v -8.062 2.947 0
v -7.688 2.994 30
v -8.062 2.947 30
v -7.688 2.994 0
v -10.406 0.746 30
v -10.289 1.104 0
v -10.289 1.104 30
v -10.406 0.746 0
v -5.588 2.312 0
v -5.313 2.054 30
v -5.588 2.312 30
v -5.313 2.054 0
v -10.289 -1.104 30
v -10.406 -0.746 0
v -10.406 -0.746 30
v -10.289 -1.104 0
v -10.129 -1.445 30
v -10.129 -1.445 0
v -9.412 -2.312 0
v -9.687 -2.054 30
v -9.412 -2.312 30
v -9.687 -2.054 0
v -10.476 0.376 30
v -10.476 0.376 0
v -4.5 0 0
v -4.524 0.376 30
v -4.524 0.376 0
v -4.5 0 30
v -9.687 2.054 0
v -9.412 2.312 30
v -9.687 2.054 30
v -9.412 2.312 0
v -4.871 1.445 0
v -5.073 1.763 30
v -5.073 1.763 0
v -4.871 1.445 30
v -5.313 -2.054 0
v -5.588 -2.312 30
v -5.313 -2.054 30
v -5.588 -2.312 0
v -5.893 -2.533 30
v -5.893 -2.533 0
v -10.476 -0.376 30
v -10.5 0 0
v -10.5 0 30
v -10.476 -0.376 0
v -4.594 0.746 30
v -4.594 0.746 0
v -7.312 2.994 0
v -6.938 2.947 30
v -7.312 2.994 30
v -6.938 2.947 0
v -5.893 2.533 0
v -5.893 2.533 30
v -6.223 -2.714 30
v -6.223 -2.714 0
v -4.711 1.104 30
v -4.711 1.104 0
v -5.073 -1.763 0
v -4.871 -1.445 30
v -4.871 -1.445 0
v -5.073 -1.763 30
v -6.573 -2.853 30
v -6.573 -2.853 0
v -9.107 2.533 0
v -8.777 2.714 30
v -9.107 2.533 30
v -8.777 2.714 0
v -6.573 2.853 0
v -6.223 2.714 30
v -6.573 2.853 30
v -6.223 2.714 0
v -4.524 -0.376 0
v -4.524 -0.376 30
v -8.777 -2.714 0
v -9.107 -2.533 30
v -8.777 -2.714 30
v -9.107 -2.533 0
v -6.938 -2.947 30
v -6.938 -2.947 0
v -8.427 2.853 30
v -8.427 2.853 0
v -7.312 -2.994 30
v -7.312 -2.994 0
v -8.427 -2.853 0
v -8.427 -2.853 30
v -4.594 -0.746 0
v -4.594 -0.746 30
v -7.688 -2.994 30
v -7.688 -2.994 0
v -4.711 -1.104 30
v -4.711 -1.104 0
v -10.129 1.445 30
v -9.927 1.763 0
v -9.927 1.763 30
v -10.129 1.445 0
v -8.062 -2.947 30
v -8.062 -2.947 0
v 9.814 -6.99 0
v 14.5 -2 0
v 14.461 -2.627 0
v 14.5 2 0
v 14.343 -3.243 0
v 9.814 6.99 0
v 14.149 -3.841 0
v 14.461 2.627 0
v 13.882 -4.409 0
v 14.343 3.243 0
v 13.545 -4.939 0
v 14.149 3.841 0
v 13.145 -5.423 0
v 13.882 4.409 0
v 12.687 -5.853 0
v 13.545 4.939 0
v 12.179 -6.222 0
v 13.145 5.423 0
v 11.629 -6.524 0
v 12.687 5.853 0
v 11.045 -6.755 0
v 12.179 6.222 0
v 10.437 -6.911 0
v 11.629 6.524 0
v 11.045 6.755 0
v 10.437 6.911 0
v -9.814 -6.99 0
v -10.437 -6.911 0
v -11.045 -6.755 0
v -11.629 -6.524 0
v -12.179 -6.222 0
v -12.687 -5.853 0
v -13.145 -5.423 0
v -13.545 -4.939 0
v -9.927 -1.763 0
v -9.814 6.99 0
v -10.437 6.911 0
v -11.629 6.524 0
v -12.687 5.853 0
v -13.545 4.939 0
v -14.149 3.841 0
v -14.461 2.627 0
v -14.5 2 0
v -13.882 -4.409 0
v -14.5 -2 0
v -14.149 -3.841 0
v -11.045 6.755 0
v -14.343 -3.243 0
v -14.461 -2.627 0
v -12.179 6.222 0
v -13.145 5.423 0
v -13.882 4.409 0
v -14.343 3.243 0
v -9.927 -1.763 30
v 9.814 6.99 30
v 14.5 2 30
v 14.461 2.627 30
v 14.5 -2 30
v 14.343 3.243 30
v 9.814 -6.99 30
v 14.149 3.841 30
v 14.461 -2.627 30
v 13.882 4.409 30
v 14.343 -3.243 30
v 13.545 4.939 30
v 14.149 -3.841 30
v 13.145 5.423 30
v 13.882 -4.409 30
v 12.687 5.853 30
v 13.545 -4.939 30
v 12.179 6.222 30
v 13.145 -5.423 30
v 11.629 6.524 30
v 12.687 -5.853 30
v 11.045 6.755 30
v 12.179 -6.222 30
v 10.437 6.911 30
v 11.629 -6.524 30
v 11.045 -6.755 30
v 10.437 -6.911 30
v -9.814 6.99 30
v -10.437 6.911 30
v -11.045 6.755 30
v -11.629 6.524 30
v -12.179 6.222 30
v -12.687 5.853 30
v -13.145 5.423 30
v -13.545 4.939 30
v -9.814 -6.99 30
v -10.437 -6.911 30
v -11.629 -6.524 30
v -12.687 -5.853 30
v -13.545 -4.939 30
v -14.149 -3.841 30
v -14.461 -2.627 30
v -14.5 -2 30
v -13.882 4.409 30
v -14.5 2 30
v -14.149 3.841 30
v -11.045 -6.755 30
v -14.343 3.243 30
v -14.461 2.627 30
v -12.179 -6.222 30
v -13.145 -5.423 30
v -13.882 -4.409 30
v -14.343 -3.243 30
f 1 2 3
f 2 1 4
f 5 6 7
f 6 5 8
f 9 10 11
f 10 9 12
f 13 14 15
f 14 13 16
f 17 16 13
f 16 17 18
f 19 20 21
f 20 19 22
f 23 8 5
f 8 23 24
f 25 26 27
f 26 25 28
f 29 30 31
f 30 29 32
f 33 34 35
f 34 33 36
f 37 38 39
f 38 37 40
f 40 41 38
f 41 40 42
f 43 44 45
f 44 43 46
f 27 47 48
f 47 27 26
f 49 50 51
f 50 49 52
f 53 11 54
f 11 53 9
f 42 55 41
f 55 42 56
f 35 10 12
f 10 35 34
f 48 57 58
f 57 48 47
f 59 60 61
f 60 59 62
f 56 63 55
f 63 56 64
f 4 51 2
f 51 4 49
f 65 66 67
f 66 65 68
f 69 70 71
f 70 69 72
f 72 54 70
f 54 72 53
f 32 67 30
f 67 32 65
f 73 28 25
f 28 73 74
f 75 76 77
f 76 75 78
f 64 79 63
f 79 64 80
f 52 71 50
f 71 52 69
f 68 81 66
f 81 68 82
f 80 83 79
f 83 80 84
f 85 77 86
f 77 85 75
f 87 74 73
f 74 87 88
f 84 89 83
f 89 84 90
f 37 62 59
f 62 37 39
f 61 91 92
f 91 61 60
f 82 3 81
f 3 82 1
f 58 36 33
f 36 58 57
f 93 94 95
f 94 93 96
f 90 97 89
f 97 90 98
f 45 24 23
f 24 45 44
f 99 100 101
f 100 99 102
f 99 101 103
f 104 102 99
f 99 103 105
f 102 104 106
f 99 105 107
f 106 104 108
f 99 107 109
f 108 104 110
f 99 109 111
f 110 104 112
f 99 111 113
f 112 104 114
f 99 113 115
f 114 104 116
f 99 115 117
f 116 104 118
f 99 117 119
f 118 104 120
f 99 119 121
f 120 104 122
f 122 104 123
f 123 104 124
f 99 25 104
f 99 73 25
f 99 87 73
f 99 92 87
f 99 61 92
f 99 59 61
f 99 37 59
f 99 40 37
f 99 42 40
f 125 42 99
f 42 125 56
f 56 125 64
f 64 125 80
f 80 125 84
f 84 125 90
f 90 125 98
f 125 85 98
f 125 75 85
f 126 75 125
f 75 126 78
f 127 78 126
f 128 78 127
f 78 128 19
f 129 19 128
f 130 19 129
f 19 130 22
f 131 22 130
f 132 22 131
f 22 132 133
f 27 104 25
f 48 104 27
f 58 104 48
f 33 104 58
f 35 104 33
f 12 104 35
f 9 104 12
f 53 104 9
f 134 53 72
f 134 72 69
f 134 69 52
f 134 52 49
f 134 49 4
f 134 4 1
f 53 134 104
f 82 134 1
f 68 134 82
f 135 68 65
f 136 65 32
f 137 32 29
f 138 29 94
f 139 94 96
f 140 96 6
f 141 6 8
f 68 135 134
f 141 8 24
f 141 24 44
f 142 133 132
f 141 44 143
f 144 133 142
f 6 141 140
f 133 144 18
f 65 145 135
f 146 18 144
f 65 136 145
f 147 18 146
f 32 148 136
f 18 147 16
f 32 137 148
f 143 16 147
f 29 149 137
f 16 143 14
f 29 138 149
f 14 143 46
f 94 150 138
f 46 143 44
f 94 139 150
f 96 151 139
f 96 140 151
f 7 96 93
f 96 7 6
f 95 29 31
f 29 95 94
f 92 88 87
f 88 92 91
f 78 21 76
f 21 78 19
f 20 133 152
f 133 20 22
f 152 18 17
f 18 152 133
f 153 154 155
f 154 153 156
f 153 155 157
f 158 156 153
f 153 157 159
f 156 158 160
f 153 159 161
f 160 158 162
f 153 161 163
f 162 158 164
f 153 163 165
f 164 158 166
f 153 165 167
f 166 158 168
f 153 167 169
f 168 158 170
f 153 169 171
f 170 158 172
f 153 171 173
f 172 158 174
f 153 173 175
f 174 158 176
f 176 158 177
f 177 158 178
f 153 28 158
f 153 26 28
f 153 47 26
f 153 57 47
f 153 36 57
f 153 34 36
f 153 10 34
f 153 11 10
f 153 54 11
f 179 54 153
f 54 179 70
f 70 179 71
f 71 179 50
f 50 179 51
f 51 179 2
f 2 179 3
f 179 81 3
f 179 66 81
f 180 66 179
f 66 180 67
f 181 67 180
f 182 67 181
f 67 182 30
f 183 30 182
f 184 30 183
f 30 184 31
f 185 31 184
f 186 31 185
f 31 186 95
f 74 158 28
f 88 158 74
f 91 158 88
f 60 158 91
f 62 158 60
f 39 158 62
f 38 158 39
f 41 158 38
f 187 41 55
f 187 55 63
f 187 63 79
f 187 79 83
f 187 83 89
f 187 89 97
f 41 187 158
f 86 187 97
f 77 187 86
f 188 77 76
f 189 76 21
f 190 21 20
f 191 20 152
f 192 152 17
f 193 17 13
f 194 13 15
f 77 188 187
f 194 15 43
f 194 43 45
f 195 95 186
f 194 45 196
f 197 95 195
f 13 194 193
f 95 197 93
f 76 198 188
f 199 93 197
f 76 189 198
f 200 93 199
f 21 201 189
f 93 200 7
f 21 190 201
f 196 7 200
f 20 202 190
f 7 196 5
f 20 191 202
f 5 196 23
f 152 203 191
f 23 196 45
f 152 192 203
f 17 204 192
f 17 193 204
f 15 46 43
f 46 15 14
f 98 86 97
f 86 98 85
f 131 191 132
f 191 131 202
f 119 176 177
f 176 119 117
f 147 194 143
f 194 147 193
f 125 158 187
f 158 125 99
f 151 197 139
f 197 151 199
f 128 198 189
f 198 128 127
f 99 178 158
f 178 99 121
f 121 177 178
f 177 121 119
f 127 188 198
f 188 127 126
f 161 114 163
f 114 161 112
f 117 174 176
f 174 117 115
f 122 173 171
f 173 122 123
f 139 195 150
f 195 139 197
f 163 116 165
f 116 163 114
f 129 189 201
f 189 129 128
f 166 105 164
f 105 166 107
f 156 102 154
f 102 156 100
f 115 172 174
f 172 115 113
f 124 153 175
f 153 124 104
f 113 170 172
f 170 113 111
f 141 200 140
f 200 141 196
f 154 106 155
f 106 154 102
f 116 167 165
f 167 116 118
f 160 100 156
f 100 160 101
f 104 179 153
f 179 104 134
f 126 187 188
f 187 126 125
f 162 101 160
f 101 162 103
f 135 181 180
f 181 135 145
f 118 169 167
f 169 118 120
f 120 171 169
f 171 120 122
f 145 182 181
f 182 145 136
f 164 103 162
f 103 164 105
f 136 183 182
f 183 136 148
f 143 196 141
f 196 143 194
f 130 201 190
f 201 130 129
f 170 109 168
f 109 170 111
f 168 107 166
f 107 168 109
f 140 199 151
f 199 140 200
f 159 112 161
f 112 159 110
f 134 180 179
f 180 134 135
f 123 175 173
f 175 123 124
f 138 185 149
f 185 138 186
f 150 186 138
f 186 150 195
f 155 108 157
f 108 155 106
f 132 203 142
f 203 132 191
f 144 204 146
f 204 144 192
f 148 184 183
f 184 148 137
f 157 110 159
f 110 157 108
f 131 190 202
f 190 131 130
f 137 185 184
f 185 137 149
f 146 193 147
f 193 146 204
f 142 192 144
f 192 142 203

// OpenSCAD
$fn = 50;


difference() {
	union() {
		hull() {
			translate(v = [-9.5000000000, 2.0000000000, 0]) {
				cylinder(h = 30, r = 5);
			}
			translate(v = [9.5000000000, 2.0000000000, 0]) {
				cylinder(h = 30, r = 5);
			}
			translate(v = [-9.5000000000, -2.0000000000, 0]) {
				cylinder(h = 30, r = 5);
			}
			translate(v = [9.5000000000, -2.0000000000, 0]) {
				cylinder(h = 30, r = 5);
			}
		}
	}
	union() {
		translate(v = [-7.5000000000, 0.0000000000, 0]) {
			cylinder(h = 30, r = 3.0000000000);
		}
		translate(v = [-7.5000000000, 0.0000000000, 0]) {
			cylinder(h = 30, r = 1.5000000000);
		}
		translate(v = [-7.5000000000, 0.0000000000, 0]) {
			cylinder(h = 30, r = 1.5000000000);
		}
		translate(v = [-7.5000000000, 0.0000000000, 0]) {
			cylinder(h = 30, r = 1.5000000000);
		}
	}
}
